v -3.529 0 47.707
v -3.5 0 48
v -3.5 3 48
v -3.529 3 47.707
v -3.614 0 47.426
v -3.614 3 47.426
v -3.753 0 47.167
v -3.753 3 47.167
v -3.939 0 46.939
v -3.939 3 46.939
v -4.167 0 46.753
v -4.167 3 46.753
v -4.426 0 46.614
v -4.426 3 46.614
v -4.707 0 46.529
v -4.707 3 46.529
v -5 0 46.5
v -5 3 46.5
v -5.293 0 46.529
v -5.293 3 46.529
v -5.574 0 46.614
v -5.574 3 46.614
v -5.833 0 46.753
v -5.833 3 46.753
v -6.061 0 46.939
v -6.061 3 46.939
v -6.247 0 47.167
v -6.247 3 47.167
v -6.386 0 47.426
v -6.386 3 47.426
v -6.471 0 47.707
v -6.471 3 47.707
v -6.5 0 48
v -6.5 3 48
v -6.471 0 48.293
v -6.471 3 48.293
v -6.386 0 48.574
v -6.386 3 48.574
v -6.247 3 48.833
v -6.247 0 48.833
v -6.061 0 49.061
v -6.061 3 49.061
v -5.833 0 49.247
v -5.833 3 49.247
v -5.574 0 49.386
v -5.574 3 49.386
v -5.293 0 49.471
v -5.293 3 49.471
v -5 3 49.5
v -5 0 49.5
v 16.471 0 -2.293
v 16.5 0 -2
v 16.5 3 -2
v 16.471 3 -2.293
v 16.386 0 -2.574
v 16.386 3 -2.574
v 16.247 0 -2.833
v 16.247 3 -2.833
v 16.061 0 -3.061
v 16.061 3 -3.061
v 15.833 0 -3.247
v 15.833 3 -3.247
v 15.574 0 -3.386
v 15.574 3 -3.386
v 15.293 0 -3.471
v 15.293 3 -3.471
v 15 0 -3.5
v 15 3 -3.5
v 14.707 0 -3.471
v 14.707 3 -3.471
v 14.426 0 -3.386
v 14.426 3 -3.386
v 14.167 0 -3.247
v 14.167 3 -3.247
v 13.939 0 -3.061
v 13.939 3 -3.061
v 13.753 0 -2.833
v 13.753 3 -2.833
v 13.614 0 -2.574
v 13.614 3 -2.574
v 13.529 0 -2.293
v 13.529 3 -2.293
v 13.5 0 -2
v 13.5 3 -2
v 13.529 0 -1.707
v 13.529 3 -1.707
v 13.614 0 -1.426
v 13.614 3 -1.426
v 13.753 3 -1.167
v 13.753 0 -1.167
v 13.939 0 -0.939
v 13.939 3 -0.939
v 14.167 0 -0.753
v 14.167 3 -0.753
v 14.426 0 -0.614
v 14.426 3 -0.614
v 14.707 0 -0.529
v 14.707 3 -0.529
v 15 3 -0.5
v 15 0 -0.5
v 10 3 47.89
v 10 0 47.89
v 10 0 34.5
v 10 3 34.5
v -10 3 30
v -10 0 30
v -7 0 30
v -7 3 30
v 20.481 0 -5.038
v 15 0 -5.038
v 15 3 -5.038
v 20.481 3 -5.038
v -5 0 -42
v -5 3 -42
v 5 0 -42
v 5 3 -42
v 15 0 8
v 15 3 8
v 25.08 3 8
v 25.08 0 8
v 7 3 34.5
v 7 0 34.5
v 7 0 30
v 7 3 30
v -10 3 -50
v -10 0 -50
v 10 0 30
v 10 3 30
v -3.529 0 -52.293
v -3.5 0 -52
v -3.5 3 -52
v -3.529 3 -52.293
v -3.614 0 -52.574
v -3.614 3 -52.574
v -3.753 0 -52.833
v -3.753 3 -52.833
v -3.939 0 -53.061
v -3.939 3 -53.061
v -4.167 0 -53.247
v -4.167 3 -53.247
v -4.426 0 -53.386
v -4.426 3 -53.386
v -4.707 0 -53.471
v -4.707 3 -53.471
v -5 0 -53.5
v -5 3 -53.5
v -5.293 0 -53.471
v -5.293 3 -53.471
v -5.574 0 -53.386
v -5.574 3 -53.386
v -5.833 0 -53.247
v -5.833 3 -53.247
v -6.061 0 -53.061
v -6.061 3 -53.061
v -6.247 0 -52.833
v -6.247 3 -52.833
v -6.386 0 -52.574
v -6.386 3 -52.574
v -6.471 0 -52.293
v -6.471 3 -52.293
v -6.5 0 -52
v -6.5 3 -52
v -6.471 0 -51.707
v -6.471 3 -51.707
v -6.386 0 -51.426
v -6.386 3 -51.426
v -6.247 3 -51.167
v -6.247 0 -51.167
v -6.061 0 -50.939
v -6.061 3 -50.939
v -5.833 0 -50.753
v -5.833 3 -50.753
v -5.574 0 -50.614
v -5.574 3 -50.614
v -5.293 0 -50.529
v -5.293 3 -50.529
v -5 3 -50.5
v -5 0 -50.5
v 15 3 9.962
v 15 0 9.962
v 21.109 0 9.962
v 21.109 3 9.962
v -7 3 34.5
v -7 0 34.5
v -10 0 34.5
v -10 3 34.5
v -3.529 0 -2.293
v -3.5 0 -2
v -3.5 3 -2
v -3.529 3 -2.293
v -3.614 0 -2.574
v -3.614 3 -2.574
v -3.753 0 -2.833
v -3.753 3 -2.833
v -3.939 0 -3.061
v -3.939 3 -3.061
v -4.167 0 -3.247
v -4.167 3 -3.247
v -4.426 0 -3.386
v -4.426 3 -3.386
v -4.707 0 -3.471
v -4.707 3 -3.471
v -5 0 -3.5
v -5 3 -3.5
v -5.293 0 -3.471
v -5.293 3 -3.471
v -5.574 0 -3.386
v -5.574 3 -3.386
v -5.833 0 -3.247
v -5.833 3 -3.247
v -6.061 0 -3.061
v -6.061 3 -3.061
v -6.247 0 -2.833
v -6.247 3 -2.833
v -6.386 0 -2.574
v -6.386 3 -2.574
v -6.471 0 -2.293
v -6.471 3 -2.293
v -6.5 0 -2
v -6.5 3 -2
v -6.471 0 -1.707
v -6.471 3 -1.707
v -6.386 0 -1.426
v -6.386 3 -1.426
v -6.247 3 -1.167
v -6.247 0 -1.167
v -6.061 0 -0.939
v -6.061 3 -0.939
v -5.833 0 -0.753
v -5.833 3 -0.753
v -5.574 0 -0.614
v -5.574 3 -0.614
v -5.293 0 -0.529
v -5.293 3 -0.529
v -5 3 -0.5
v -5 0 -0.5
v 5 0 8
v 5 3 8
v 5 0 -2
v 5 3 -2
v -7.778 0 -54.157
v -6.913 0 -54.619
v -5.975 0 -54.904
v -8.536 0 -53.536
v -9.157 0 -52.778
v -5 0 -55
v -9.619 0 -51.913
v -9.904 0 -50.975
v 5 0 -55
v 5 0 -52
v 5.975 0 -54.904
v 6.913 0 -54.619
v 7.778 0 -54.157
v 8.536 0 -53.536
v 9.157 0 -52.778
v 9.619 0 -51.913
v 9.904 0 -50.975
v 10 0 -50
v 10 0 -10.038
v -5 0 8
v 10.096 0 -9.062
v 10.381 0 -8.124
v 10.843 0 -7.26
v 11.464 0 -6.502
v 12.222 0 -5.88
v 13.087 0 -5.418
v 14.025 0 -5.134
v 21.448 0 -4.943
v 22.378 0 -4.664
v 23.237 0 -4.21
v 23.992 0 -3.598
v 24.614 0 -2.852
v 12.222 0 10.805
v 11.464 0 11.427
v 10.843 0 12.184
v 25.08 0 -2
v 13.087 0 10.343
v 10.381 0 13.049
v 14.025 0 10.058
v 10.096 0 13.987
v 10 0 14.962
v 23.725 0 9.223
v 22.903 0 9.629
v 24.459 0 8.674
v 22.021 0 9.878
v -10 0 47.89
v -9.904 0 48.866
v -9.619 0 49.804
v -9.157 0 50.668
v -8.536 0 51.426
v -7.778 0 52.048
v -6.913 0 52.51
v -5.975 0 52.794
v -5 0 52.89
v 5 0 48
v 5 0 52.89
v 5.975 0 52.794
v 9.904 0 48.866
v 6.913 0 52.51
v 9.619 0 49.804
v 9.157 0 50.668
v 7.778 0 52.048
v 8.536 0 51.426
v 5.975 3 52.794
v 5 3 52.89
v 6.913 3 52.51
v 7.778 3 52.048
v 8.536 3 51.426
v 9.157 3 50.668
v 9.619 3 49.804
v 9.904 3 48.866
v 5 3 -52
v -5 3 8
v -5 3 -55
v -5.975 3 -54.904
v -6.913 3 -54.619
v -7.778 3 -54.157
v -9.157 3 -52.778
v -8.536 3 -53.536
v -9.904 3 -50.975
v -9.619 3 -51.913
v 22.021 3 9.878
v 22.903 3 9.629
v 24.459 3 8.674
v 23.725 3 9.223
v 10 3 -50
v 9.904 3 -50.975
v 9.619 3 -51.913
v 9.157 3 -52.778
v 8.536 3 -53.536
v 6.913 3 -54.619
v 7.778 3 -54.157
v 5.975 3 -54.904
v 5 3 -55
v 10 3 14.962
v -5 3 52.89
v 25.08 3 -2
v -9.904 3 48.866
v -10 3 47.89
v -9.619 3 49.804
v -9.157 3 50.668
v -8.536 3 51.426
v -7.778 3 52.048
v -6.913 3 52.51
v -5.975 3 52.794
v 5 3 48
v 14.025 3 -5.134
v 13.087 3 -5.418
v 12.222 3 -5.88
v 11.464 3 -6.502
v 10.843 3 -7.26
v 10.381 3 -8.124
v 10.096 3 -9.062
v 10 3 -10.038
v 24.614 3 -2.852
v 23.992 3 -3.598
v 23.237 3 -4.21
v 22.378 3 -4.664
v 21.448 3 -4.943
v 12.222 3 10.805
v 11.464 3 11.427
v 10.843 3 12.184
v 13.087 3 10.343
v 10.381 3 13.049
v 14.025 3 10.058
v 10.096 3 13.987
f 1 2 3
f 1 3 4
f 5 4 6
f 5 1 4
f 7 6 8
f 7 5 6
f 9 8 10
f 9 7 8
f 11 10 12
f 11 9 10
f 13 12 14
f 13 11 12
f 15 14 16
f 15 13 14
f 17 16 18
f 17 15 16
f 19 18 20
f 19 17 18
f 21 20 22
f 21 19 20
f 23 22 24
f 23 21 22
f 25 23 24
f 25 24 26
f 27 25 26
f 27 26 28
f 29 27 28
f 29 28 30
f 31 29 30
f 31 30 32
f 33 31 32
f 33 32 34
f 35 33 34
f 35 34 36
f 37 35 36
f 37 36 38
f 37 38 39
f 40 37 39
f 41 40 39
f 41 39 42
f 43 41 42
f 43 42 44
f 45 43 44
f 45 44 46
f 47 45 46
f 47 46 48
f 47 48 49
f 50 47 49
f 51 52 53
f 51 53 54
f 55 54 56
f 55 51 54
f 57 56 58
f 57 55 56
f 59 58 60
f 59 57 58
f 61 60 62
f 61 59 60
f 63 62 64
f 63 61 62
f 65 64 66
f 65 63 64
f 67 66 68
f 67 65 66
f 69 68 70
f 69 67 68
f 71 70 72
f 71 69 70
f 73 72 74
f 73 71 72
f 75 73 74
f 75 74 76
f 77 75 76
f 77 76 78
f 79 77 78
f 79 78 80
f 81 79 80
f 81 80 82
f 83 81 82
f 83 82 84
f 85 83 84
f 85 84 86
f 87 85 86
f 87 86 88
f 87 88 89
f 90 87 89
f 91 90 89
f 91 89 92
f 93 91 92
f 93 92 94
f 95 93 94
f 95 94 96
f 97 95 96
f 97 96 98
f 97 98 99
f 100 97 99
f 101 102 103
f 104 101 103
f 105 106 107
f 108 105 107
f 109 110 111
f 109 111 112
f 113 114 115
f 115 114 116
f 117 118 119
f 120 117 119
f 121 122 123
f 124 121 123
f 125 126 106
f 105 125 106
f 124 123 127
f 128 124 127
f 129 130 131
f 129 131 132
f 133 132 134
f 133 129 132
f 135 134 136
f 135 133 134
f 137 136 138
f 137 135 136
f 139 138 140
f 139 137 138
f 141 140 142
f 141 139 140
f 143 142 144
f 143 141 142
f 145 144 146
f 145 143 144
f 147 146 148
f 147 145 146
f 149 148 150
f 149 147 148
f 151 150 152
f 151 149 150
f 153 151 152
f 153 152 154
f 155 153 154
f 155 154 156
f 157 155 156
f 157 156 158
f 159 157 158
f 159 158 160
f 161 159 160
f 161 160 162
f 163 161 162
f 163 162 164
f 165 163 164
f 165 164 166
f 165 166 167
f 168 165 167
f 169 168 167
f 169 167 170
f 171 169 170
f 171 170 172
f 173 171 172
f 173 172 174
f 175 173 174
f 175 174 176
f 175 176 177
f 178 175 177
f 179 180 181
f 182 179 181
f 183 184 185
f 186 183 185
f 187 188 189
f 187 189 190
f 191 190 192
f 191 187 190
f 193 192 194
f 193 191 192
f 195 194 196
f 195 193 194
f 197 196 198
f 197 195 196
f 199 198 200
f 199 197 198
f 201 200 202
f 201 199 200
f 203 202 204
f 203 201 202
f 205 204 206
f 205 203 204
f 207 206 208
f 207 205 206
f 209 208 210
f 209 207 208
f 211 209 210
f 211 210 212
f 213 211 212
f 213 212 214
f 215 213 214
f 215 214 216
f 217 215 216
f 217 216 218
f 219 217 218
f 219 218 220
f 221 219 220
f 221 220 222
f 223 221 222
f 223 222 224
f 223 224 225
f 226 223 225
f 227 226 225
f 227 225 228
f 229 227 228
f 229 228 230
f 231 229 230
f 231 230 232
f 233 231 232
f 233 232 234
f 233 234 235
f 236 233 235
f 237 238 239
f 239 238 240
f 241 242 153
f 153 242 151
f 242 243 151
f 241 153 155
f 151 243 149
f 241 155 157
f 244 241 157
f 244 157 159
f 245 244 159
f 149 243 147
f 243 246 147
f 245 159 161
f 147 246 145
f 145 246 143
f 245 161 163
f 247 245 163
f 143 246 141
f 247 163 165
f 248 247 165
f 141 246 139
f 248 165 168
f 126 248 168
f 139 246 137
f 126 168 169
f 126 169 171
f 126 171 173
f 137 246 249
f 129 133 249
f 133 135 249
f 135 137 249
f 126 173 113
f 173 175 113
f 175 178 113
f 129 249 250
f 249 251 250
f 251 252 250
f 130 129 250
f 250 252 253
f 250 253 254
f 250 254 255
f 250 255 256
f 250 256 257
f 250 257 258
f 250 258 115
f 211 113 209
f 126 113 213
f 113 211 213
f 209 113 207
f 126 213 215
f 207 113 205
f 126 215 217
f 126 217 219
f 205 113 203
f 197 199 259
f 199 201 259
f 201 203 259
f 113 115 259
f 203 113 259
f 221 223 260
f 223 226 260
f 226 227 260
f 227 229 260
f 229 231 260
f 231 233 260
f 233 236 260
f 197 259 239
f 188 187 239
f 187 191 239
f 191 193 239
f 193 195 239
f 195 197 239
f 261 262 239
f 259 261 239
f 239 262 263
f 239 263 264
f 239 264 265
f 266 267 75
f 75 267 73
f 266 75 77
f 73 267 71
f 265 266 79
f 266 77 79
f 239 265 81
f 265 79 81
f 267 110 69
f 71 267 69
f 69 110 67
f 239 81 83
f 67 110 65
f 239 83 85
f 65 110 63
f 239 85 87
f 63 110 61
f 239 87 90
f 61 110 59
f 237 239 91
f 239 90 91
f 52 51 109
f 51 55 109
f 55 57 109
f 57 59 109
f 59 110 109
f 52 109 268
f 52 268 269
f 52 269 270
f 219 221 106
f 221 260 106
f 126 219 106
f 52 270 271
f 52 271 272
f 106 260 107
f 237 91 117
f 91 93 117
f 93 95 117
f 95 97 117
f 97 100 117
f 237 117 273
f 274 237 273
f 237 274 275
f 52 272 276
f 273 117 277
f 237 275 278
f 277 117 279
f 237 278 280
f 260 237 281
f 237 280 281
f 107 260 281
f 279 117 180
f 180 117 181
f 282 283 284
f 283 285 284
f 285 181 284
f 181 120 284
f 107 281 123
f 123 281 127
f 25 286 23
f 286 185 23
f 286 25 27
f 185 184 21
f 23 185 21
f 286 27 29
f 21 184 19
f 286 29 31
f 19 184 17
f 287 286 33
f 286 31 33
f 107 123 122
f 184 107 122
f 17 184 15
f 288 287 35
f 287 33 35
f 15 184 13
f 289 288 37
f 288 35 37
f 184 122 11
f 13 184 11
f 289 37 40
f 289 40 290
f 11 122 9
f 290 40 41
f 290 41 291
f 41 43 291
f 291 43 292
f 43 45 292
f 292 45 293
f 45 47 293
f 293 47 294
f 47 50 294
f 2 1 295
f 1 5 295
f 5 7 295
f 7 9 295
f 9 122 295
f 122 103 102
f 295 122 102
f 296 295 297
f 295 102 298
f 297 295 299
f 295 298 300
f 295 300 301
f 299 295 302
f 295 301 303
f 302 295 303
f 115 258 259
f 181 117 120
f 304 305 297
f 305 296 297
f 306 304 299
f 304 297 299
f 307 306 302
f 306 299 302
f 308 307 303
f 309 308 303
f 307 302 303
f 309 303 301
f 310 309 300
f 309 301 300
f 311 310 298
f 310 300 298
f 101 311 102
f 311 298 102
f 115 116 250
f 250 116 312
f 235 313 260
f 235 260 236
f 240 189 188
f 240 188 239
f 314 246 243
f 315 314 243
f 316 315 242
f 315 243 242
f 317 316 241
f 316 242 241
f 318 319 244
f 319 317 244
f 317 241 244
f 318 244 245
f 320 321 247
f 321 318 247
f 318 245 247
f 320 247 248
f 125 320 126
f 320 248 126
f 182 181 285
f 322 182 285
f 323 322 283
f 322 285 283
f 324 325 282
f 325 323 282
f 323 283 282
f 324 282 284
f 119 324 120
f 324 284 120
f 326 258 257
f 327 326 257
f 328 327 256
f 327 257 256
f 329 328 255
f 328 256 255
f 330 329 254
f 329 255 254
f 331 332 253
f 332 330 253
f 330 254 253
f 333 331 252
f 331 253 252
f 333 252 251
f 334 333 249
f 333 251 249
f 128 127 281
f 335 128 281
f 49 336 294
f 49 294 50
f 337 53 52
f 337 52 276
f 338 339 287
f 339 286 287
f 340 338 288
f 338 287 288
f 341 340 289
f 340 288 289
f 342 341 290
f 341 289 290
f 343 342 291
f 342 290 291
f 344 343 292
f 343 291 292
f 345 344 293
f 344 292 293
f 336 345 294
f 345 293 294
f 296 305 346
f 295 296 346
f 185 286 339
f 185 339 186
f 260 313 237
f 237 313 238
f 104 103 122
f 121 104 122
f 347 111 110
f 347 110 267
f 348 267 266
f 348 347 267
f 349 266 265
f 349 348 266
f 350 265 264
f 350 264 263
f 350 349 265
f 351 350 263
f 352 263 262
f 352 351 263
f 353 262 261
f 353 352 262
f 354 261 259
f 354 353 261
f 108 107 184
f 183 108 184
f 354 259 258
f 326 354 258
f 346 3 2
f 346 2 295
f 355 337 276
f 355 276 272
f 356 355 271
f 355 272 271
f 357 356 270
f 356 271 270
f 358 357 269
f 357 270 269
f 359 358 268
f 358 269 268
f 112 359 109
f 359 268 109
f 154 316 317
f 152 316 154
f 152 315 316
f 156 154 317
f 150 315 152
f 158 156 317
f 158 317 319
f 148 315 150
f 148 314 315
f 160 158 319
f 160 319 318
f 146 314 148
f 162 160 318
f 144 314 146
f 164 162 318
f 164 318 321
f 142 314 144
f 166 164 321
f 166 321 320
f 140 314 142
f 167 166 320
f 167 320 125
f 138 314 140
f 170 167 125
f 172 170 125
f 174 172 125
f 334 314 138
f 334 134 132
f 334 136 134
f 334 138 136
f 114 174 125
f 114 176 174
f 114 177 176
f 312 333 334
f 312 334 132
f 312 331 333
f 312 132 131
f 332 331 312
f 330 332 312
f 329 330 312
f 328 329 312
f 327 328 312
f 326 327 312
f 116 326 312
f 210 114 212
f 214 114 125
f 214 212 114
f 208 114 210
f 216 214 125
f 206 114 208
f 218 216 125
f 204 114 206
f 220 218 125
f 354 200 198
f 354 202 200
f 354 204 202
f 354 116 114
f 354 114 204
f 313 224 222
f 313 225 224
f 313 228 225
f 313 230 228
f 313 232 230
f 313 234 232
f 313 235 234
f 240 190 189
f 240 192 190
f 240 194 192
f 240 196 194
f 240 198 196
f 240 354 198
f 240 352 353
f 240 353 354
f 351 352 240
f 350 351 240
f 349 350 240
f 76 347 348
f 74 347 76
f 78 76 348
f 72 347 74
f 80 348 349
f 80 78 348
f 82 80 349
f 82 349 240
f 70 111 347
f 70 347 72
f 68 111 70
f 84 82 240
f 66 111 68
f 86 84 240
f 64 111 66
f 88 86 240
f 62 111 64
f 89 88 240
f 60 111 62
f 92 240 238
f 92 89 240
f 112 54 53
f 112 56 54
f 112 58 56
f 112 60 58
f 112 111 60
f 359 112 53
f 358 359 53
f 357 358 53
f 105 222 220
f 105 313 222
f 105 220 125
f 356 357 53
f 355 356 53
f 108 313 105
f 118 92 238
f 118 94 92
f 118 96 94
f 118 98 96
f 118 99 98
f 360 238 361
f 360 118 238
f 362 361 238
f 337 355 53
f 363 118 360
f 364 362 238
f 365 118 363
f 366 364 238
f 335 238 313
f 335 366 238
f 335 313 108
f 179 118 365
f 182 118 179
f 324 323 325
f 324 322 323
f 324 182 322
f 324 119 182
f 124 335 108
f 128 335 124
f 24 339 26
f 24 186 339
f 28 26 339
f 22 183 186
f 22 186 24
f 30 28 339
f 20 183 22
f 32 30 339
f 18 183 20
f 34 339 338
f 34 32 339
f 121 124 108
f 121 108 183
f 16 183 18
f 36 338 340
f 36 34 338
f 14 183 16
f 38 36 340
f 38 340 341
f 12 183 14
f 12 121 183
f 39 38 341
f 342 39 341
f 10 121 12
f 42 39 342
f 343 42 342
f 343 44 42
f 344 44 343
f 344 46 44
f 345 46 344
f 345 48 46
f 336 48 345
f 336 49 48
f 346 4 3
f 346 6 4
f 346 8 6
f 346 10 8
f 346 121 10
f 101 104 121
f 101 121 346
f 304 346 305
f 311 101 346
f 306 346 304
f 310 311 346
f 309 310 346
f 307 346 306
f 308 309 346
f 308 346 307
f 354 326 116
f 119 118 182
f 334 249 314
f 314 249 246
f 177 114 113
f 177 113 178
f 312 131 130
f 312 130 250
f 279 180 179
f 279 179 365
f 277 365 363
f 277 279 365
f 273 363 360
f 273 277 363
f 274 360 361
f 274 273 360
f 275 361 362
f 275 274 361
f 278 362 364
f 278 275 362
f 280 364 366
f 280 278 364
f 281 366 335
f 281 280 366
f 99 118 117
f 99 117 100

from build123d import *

# Parameters (mm, degrees)
SKETCH1_R           = 1.5
SKETCH1_W           = 20
SKETCH1_H           = 5
BOSS_EXTRUDE3_DEPTH = 3
FILLET2_R           = 5
CUT_EXTRUDE1_REACH  = 74.753
SKETCH3_W           = 28.786192162
SKETCH3_H           = 21.000620262
FILLET3_R           = 5
SKETCH5_W           = 10
SKETCH5_H           = 10
CUT_EXTRUDE2_DEPTH  = 10
BOSS_EXTRUDE5_START = -3
SKETCH8_W           = 35
SKETCH8_H           = 15
SKETCH8_R           = 1.5
BOSS_EXTRUDE5_DEPTH = 3
CUT_EXTRUDE3_REACH  = 62.523
SKETCH9_W           = 10
SKETCH9_H           = 10
SKETCH9_W_2         = 11
FILLET4_R           = 5


with BuildPart() as part:
    # Sketch1 → Boss-Extrude3 (new body)
    # profile 1 of 3: a face of its own
    with BuildSketch(Plane(origin=(0, 0, 0), x_dir=(1, 0, 0), z_dir=(0, 1, 0))):
        Polygon((10, 55), (-10, 55), (-10, -30), (-7, -30), (-7, -34.5), (-10, -34.5), (-10, -50), (10, -50), (10, -34.5), (7, -34.5), (7, -30), (10, -30), align=None)
        with Locations(Location((-5, -48, 0), (0, 0, 270))):
            Circle(SKETCH1_R, mode=Mode.SUBTRACT)
        with Locations(Location((-5, 2, 0), (0, 0, 270))):
            Circle(SKETCH1_R, mode=Mode.SUBTRACT)
        with Locations(Location((-5, 52, 0), (0, 0, 270))):
            Circle(SKETCH1_R, mode=Mode.SUBTRACT)
    # profile 2 of 3: a face of its own
    with BuildSketch(Plane(origin=(0, 0, 0), x_dir=(1, 0, 0), z_dir=(0, 1, 0))):
        Polygon((10, -55), (-10, -55), (-10, -64.5), (-7, -64.5), (-7, -69), (-10, -69), (-10, -72), (10, -72), (10, -69), (7, -69), (7, -64.5), (10, -64.5), align=None)
    # profile 3 of 3: a face of its own
    with BuildSketch(Plane(origin=(0, 0, 0), x_dir=(1, 0, 0), z_dir=(0, 1, 0))):
        with Locations((0, -52.5)):
            Rectangle(SKETCH1_W, SKETCH1_H)
    extrude(amount=BOSS_EXTRUDE3_DEPTH)

    # Fillet2
    # the kernel refuses this fillet: 5 mm, written as the material it takes off along each edge
    with BuildSketch(Plane(origin=(10, -11.456439237, 72), x_dir=(0, 0, -1), z_dir=(0, 1, 0))) as fillet2_piece_1:
        with BuildLine():
            CenterArc((5, 4.582575695), FILLET2_R, 180, 66.421821522)
            Line((0, 4.582575695), (-0.1, 4.582575695))
            Line((-0.1, 4.582575695), (-0.1, 0))
            Line((-0.1, 0), (0, -0.1))
            ThreePointArc((0, -0.1), (1.5, -0.1), (2.96, -0.091651514))
            Line((2.96, -0.091651514), (3, 0))
        make_face()
    extrude(amount=25.912878475, mode=Mode.SUBTRACT)
    with BuildSketch(Plane(origin=(-10, -11.456439237, 72), x_dir=(1, 0, 0), z_dir=(0, 1, 0))) as fillet2_piece_2:
        with BuildLine():
            CenterArc((4.582575695, 5), FILLET2_R, 203.578178478, 66.421821522)
            Line((0, 3), (-0.091651514, 2.96))
            ThreePointArc((-0.091651514, 2.96), (-0.1, 1.5), (-0.1, 0))
            Line((-0.1, 0), (0, -0.1))
            Line((0, -0.1), (4.582575695, -0.1))
            Line((4.582575695, -0.1), (4.582575695, 0))
        make_face()
    extrude(amount=25.912878475, mode=Mode.SUBTRACT)
    with BuildSketch(Plane(origin=(-10, -12.5, -55), x_dir=(0, 0, 1), z_dir=(0, 1, 0))) as fillet2_piece_3:
        with BuildLine():
            CenterArc((FILLET2_R, FILLET2_R), FILLET2_R, 180, 90)
            Line((0, FILLET2_R), (-FILLET2_R * 0.02, FILLET2_R))
            Line((-FILLET2_R * 0.02, FILLET2_R), (-FILLET2_R * 0.02, -FILLET2_R * 0.02))
            Line((-FILLET2_R * 0.02, -FILLET2_R * 0.02), (FILLET2_R, -FILLET2_R * 0.02))
            Line((FILLET2_R, -FILLET2_R * 0.02), (FILLET2_R, 0))
        make_face()
    extrude(amount=28, mode=Mode.SUBTRACT)
    with BuildSketch(Plane(origin=(10, -12.5, -55), x_dir=(0, 0, 1), z_dir=(0, 1, 0))) as fillet2_piece_4:
        with BuildLine():
            CenterArc((FILLET2_R, -FILLET2_R), FILLET2_R, 90, 90)
            Line((0, -FILLET2_R), (-FILLET2_R * 0.02, -FILLET2_R))
            Line((-FILLET2_R * 0.02, -FILLET2_R), (-FILLET2_R * 0.02, FILLET2_R * 0.02))
            Line((-FILLET2_R * 0.02, FILLET2_R * 0.02), (FILLET2_R, FILLET2_R * 0.02))
            Line((FILLET2_R, FILLET2_R * 0.02), (FILLET2_R, 0))
        make_face()
    extrude(amount=28, mode=Mode.SUBTRACT)

    # Sketch3 → Cut-Extrude1 (cut, up to next)
    with BuildSketch(Plane(origin=(0, 3, 0), x_dir=(1, 0, 0), z_dir=(0, 1, 0)), mode=Mode.PRIVATE) as cut_extrude1_sk1:
        with Locations((0, -63.390803798)):
            Rectangle(SKETCH3_W, SKETCH3_H)
    cut_extrude1_tool1 = extrude(cut_extrude1_sk1.sketch, amount=-CUT_EXTRUDE1_REACH, mode=Mode.PRIVATE) & part.part
    add(cut_extrude1_tool1.solids().sort_by_distance((0, 3, 63.390804))[0], mode=Mode.SUBTRACT)

    # Fillet3
    fillet3_edges = [part.edges().sort_by_distance(p)[0] for p in [
        (10, 1.5, 52.890493667),
        (-10, 1.5, 52.890493667),
    ]]
    fillet(fillet3_edges, radius=FILLET3_R)

    # Sketch5 → Cut-Extrude2 (cut)
    with BuildSketch(Plane(origin=(0, 3, 0), x_dir=(1, 0, 0), z_dir=(0, 1, 0))):
        with Locations((0, -53)):
            Rectangle(SKETCH5_W, SKETCH5_H)
        with Locations((0, 47)):
            Rectangle(SKETCH5_W, SKETCH5_H)
    extrude(amount=-CUT_EXTRUDE2_DEPTH, mode=Mode.SUBTRACT)

    # Sketch8 → Boss-Extrude5 (add)
    with BuildSketch(Plane(origin=(0, 3, 0), x_dir=(1, 0, 0), z_dir=(0, 1, 0)).offset(BOSS_EXTRUDE5_START)):
        with Locations((7.580003557, -2.462217959)):
            Rectangle(SKETCH8_W, SKETCH8_H)
        with Locations(Location((15, 2, 0), (0, 0, 270))):
            Circle(SKETCH8_R, mode=Mode.SUBTRACT)
        with Locations(Location((-5, 2, 0), (0, 0, 270))):
            Circle(SKETCH8_R, mode=Mode.SUBTRACT)
    extrude(amount=BOSS_EXTRUDE5_DEPTH)

    # Sketch9 → Cut-Extrude3 (cut, up to next)
    with BuildSketch(Plane(origin=(0, 3, 0), x_dir=(1, 0, 0), z_dir=(0, 1, 0)), mode=Mode.PRIVATE) as cut_extrude3_sk1:
        with Locations((0, -3)):
            Rectangle(SKETCH9_W, SKETCH9_H)
    cut_extrude3_tool1 = extrude(cut_extrude3_sk1.sketch, amount=-CUT_EXTRUDE3_REACH, mode=Mode.PRIVATE) & part.part
    # Sketch9 → Cut-Extrude3 (cut, up to next)
    with BuildSketch(Plane(origin=(0, 3, 0), x_dir=(1, 0, 0), z_dir=(0, 1, 0)), mode=Mode.PRIVATE) as cut_extrude3_sk2:
        with Locations((20.5, -3)):
            Rectangle(SKETCH9_W_2, SKETCH9_H)
    cut_extrude3_tool2 = extrude(cut_extrude3_sk2.sketch, amount=-CUT_EXTRUDE3_REACH, mode=Mode.PRIVATE) & part.part
    add(cut_extrude3_tool1.solids().sort_by_distance((0, 3, 3))[0], mode=Mode.SUBTRACT)
    add(cut_extrude3_tool2.solids().sort_by_distance((20.5, 3, 3))[0], mode=Mode.SUBTRACT)

    # Fillet4
    # the kernel refuses this fillet: 5 mm, written as the material it adds along each edge
    with BuildSketch(Plane(origin=(10, 0, 9.962217959), x_dir=(1, 0, 0), z_dir=(0, 1, 0))) as fillet4_piece_1:
        with BuildLine():
            CenterArc((FILLET4_R, -FILLET4_R), FILLET4_R, 90, 90)
            Line((0, -FILLET4_R), (0, 0))
            Line((0, 0), (FILLET4_R, 0))
        make_face()
    extrude(amount=3)
    with BuildSketch(Plane(origin=(10, 3, -5.037782041), x_dir=(0, 0, -1), z_dir=(0, -1, 0))) as fillet4_piece_2:
        with BuildLine():
            CenterArc((FILLET4_R, FILLET4_R), FILLET4_R, 180, 90)
            Line((0, FILLET4_R), (0, 0))
            Line((0, 0), (FILLET4_R, 0))
        make_face()
    extrude(amount=3)
    # the kernel refuses this fillet: 5 mm, written as the material it takes off along each edge
    with BuildSketch(Plane(origin=(25.080003557, -9.928456662, 9.962217959), x_dir=(0, 0, -1), z_dir=(0, 1, 0))) as fillet4_2_piece_1:
        with BuildLine():
            CenterArc((5, 3.971382665), FILLET4_R, 180, 52.586975679)
            Line((0, 3.971382665), (0, 0))
            Line((0, 0), (1.962217959, 0))
        make_face()
    extrude(amount=22.856913325, mode=Mode.SUBTRACT)
    with BuildSketch(Plane(origin=(25.080003557, -11.497200931, -5.037782041), x_dir=(-1, 0, 0), z_dir=(0, 1, 0))) as fillet4_2_piece_2:
        with BuildLine():
            CenterArc((4.598880373, 5), FILLET4_R, 203.106632515, 66.893367485)
            Line((0, 3.037782041), (0, 0))
            Line((0, 0), (4.598880373, 0))
        make_face()
    extrude(amount=25.994401863, mode=Mode.SUBTRACT)


solid = part.part
